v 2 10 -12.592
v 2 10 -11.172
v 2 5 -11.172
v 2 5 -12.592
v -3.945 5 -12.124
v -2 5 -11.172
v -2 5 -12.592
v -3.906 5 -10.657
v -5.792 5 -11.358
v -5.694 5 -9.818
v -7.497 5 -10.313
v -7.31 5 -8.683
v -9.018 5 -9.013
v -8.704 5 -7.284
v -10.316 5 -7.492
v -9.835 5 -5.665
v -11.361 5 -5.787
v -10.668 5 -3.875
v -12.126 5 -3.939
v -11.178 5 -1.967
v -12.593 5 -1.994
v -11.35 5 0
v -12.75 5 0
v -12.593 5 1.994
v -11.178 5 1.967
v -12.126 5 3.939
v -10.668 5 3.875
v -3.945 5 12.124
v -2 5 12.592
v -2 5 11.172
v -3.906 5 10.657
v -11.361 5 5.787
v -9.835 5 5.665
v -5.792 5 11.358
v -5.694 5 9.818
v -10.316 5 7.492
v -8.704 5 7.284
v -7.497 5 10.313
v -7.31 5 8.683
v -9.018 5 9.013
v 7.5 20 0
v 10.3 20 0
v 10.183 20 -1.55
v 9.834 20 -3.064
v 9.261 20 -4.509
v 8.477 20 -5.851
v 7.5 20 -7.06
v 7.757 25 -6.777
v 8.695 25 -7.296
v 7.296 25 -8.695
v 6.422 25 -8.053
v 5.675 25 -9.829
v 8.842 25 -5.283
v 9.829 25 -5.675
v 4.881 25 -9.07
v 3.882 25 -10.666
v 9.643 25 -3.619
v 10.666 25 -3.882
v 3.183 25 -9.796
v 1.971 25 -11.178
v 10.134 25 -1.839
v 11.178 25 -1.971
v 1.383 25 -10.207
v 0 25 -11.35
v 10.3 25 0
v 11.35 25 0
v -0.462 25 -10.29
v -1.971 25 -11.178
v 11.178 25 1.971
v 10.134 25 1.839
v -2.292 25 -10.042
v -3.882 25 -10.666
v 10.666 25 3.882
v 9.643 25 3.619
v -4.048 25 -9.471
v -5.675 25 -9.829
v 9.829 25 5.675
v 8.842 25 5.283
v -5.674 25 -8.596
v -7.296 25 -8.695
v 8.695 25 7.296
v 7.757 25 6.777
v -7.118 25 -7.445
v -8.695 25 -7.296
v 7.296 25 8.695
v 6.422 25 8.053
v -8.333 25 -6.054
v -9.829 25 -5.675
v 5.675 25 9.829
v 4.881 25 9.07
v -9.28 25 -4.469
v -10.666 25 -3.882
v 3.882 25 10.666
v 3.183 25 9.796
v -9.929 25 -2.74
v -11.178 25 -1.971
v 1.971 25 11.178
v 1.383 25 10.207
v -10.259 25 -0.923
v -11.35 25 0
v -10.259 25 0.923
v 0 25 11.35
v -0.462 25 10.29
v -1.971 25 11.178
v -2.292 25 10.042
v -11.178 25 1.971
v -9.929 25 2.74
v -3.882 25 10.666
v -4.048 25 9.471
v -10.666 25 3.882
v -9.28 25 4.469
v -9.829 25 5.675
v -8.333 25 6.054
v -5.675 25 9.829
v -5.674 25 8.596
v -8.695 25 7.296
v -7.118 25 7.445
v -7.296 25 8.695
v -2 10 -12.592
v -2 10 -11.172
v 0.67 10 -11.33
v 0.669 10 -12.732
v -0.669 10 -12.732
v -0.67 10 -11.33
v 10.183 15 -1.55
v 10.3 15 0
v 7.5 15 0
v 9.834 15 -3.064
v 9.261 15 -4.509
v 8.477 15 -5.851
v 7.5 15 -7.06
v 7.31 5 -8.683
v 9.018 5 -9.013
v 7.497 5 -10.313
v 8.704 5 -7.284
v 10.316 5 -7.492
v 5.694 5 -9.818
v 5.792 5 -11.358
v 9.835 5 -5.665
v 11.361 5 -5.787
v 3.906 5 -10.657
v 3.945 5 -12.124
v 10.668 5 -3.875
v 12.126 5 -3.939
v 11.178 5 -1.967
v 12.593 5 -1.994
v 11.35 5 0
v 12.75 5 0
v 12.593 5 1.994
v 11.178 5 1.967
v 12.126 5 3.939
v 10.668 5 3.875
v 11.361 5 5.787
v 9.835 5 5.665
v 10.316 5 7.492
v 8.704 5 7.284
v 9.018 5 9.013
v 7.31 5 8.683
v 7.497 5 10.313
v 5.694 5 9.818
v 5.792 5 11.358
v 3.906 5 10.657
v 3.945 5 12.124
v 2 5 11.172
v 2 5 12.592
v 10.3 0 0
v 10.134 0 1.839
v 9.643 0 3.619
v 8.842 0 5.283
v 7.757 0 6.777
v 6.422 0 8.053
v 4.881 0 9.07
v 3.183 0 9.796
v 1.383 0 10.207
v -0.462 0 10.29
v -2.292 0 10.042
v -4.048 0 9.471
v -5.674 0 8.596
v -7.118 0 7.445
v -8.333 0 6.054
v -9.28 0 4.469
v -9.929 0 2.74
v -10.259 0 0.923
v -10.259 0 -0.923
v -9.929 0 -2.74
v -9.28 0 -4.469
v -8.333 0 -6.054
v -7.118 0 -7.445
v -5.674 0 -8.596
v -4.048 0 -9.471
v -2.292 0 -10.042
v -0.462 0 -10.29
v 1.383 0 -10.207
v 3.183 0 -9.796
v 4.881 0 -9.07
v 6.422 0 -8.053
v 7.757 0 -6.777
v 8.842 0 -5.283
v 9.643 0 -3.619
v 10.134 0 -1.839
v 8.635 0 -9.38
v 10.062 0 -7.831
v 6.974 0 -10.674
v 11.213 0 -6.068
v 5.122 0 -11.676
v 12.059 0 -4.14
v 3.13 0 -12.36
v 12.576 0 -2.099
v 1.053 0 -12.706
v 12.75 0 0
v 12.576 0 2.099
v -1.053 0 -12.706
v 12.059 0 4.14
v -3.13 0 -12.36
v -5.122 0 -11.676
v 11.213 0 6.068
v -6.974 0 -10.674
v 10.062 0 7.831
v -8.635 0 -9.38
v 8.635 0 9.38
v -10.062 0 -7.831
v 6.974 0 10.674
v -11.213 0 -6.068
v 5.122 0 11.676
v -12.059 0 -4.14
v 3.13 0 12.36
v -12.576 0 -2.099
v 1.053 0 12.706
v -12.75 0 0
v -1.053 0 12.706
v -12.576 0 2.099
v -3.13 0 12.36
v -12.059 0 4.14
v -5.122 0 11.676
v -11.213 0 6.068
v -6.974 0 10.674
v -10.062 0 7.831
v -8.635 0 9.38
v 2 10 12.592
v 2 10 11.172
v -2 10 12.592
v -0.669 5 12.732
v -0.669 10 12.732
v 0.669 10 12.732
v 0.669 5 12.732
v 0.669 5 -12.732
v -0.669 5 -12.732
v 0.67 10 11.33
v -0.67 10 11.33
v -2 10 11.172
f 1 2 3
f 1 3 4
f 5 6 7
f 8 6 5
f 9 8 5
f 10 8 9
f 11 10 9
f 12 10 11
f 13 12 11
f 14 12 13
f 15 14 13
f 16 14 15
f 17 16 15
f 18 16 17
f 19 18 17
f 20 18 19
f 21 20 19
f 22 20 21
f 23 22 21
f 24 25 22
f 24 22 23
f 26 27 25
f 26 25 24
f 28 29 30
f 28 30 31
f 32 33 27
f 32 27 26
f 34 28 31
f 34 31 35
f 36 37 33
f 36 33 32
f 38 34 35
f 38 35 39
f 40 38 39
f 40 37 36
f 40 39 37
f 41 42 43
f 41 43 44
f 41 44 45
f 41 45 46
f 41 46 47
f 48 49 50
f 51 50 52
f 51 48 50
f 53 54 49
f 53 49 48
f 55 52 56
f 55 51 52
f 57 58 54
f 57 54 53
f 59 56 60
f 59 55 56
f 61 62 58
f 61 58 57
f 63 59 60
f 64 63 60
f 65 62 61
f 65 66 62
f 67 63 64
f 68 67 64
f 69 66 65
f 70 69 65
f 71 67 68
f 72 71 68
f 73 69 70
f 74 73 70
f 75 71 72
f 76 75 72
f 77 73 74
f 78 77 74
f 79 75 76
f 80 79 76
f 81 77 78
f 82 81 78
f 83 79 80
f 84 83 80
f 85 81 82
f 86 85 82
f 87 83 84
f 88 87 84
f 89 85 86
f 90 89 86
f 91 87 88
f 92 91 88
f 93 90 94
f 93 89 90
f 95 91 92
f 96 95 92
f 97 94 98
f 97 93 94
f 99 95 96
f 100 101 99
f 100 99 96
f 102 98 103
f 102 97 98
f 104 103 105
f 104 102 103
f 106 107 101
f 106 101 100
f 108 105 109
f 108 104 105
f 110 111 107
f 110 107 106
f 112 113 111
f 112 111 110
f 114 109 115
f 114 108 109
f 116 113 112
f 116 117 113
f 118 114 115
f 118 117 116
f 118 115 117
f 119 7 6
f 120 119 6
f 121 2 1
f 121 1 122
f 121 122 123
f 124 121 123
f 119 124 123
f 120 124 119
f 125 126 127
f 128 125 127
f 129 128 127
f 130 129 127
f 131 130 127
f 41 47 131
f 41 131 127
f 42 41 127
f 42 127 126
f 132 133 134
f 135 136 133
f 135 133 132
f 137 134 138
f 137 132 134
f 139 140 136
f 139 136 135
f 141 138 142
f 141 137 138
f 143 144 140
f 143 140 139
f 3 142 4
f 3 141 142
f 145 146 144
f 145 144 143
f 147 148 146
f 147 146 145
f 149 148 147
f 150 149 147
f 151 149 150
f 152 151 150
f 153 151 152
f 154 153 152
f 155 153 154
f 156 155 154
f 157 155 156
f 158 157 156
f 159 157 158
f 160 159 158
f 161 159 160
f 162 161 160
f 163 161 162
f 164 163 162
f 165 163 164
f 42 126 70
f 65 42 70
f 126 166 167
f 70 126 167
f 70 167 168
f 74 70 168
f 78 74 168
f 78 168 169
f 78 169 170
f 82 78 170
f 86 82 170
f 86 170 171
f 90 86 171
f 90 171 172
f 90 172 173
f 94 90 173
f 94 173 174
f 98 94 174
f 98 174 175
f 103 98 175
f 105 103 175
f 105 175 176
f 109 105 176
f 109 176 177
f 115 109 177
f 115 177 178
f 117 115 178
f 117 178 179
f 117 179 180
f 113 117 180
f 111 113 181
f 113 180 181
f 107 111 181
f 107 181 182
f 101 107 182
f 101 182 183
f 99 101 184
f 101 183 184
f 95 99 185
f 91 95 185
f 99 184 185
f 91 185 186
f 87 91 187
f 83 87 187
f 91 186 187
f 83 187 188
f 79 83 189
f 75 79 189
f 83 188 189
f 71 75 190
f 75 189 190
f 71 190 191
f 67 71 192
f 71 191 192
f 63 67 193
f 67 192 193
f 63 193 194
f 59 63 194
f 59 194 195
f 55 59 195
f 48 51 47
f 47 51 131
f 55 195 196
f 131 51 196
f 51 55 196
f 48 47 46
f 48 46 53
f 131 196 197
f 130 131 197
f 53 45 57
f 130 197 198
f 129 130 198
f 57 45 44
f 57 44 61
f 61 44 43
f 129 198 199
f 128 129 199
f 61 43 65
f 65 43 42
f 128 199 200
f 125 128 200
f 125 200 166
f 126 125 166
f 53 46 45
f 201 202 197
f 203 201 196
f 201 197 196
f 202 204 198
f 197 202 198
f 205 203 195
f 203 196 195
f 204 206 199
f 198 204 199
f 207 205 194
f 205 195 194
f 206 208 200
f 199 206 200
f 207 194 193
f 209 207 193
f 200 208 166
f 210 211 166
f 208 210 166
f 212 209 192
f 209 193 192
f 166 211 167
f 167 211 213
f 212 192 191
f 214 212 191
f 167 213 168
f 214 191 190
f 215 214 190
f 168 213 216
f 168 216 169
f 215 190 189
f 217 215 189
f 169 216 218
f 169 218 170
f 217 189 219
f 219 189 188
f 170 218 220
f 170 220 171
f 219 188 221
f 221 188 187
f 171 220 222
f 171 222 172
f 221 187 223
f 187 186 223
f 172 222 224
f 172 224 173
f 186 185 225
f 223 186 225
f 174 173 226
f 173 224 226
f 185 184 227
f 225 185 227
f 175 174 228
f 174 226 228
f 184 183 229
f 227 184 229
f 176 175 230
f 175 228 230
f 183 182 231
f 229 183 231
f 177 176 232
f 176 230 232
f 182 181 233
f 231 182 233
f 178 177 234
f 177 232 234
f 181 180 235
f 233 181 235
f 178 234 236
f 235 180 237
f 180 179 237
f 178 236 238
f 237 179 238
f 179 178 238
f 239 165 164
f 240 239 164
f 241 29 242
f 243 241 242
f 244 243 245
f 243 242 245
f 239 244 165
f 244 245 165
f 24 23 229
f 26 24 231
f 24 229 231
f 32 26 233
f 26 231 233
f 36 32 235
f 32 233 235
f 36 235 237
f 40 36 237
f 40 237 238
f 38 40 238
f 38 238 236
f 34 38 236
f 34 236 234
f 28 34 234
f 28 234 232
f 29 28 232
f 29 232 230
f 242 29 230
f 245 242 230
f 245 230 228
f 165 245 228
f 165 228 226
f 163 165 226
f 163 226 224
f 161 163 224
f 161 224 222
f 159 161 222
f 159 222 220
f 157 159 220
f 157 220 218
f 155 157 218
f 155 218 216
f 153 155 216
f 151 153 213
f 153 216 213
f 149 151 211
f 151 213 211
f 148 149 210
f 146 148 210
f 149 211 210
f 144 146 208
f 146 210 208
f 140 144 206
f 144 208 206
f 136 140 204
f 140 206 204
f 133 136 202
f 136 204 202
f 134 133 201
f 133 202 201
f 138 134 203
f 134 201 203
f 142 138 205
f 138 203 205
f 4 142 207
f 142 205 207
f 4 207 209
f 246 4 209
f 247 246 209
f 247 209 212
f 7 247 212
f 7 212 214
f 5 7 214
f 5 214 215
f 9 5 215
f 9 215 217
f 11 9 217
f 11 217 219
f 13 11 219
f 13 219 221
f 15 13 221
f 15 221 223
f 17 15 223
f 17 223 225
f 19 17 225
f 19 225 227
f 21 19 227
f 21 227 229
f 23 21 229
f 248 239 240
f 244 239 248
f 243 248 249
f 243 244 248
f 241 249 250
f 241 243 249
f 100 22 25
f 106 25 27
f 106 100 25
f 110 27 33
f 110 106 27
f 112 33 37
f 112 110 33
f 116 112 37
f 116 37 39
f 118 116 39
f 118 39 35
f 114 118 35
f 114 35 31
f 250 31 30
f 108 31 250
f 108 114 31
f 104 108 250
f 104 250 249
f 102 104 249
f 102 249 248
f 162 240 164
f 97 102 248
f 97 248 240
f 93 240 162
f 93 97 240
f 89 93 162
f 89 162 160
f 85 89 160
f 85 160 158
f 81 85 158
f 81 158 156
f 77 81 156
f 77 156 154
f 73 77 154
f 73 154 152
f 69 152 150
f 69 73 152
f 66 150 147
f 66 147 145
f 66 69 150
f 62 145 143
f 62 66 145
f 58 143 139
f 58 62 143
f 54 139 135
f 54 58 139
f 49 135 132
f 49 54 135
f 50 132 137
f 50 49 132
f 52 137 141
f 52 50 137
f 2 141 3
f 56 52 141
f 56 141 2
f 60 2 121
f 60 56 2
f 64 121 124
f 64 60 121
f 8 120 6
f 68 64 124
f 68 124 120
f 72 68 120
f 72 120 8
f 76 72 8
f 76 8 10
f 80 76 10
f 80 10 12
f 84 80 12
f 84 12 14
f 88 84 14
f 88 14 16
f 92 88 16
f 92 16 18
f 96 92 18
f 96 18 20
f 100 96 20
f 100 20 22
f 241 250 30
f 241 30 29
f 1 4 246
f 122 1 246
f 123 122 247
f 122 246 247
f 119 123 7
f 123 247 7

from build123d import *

# Parameters (mm, degrees)
F0_R         = 10.3
F1_DEPTH     = 9
F3_R         = 3.1
F4_DEPTH     = 9.001
F6_DEPTH     = 1.8
F7_T4_ANGLE  = 359.64
F7_S5_R      = 3.1
F7_T6_DEPTH  = 5
F7_T10_ANGLE = 359.64
F7_S11_R     = 3.1
F7_T12_DEPTH = 5
F7_T16_ANGLE = 359.64
F7_S17_R     = 3.1
F7_T18_DEPTH = 5
F9_R         = 12.75
F10_DEPTH    = 25
F11_R        = 3.1
F12_DEPTH    = 34.0010001
F13_R        = 12.75
F13_R_2      = 11.35
F14_DEPTH    = 20
F16_DEPTH    = 5
F17_R        = 10.3
F18_DEPTH    = 34.0010001
F20_START    = -5
F20_DEPTH    = 5


# Not quite as in the source:
# - a fillet or chamfer that OpenCascade refuses, or shapes differently, is made with other operations: its cross-section is extruded or revolved along the edge and cut away or added


with BuildPart() as f1:
    # F0 (on Front) → F1 (new body)
    with BuildSketch(Plane.XZ):
        Circle(F0_R)
    extrude(amount=F1_DEPTH)

    # F3 (on face) → F4 (cut, through all)
    with BuildSketch(Plane.XZ.offset(9)):
        Circle(F3_R)
    extrude(amount=-F4_DEPTH, mode=Mode.SUBTRACT)

    # F5 (on face) → F6 (cut)
    with BuildSketch(Plane.XZ.offset(9)):
        with BuildLine():
            ThreePointArc((-3.0819681678, 0.333874546), (-2.6846787517, 1.55), (-1.8301279224, 2.502125454))
            ThreePointArc((-1.8301279224, 2.502125454), (-6.4951905284, 3.75), (-3.0819681678, 0.333874546))
        make_face()
        with BuildLine():
            ThreePointArc((6.8301270189, 2.5), (4.331189746, 4.9999997741), (1.8301279224, 2.502125454))
            ThreePointArc((1.8301279224, 2.502125454), (2.6846787517, 1.55), (3.0819681678, 0.333874546))
            ThreePointArc((3.0819681678, 0.333874546), (5.5810472546, 0.3354680497), (6.8301270189, 2.5))
        make_face()
        with BuildLine():
            ThreePointArc((1.2518402454, -2.836), (0, -3.1), (-1.2518402454, -2.836))
            ThreePointArc((-1.2518402454, -2.836), (-1.2490795384, -7.1655946774), (2.5, -5))
            ThreePointArc((2.5, -5), (2.1655946774, -3.7509204616), (1.2518402454, -2.836))
        make_face()
    extrude(amount=-F6_DEPTH, mode=Mode.SUBTRACT)

    # F7: fillet of radius 1 on 3 edges, made by hand


with BuildPart() as f7_tool2:
    # F7_s3 → F7_t4 (revolve)
    with BuildSketch(Plane(origin=(0.0078111935, 0, 0.0136280797), x_dir=(0, 1, 0), z_dir=(-0.497276838, 0, -0.8675919239))):
        with BuildLine():
            ThreePointArc((-8.2, -2.499975326), (-7.4928932188, -2.7928685448), (-7.2, -3.499975326))
            Line((-7.2, -3.499975326), (-7.18, -3.499975326))
            Line((-7.18, -3.499975326), (-7.18, -2.479975326))
            Line((-7.18, -2.479975326), (-8.2, -2.479975326))
            Line((-8.2, -2.479975326), (-8.2, -2.499975326))
        make_face()
    revolve(axis=Axis((-4.3301270189, -7.2, 2.5), (0, -1, 0)), revolution_arc=F7_T4_ANGLE)

    # F7_s5 → F7_t6 (cut, symmetric)
    with BuildSketch(Plane.XZ.offset(7.7)):
        Circle(F7_S5_R)
    extrude(amount=F7_T6_DEPTH, both=True, mode=Mode.SUBTRACT)


with BuildPart() as f1_1:
    add(f1.part)

    # F7_t1: union F7_tool2
    add(f7_tool2.part)


with BuildPart() as f7_tool8:
    # F7_s9 → F7_t10 (revolve)
    with BuildSketch(Plane(origin=(0.0078966665, 0, -0.0135787318), x_dir=(0, 1, 0), z_dir=(-0.5027182272, 0, 0.8644503364))):
        with BuildLine():
            ThreePointArc((-8.2, -2.499975326), (-7.4928932188, -2.7928685448), (-7.2, -3.499975326))
            Line((-7.2, -3.499975326), (-7.18, -3.499975326))
            Line((-7.18, -3.499975326), (-7.18, -2.479975326))
            Line((-7.18, -2.479975326), (-8.2, -2.479975326))
            Line((-8.2, -2.479975326), (-8.2, -2.499975326))
        make_face()
    revolve(axis=Axis((4.3301270189, -7.2, 2.5), (0, -1, 0)), revolution_arc=F7_T10_ANGLE)

    # F7_s11 → F7_t12 (cut, symmetric)
    with BuildSketch(Plane.XZ.offset(7.7)):
        Circle(F7_S11_R)
    extrude(amount=F7_T12_DEPTH, both=True, mode=Mode.SUBTRACT)


with BuildPart() as f1_2:
    add(f1_1.part)

    # F7_t7: union F7_tool8
    add(f7_tool8.part)


with BuildPart() as f7_tool14:
    # F7_s15 → F7_t16 (revolve)
    with BuildSketch(Plane(origin=(-0.0157078599, 0, -4.93479e-05), x_dir=(0, 1, 0), z_dir=(0.9999950652, 0, 0.0031415875))):
        with BuildLine():
            ThreePointArc((-8.2, -2.499975326), (-7.4928932188, -2.7928685448), (-7.2, -3.499975326))
            Line((-7.2, -3.499975326), (-7.18, -3.499975326))
            Line((-7.18, -3.499975326), (-7.18, -2.479975326))
            Line((-7.18, -2.479975326), (-8.2, -2.479975326))
            Line((-8.2, -2.479975326), (-8.2, -2.499975326))
        make_face()
    revolve(axis=Axis((0, -7.2, -5), (0, -1, 0)), revolution_arc=F7_T16_ANGLE)

    # F7_s17 → F7_t18 (cut, symmetric)
    with BuildSketch(Plane.XZ.offset(7.7)):
        Circle(F7_S17_R)
    extrude(amount=F7_T18_DEPTH, both=True, mode=Mode.SUBTRACT)


with BuildPart() as f1_3:
    add(f1_2.part)

    # F7_t13: union F7_tool14
    add(f7_tool14.part)

    # F9 (on offset) → F10 (join)
    with BuildSketch(Plane(origin=(0, 0, 0), x_dir=(-1, 0, 0), z_dir=(0, 1, 0))):
        Circle(F9_R)
    extrude(amount=F10_DEPTH)

    # F11 (on face) → F12 (cut, through all)
    with BuildSketch(Plane(origin=(0, 25, 0), x_dir=(-1, 0, 0), z_dir=(0, 1, 0))):
        Circle(F11_R)
    extrude(amount=-F12_DEPTH, mode=Mode.SUBTRACT)

    # F13 (on face) → F14 (cut)
    with BuildSketch(Plane(origin=(0, 25, 0), x_dir=(-1, 0, 0), z_dir=(0, 1, 0))):
        Circle(F13_R)
        Circle(F13_R_2, mode=Mode.SUBTRACT)
    extrude(amount=-F14_DEPTH, mode=Mode.SUBTRACT)

    # F15 (on face) → F16 (join)
    with BuildSketch(Plane(origin=(0, 5, 0), x_dir=(-1, 0, 0), z_dir=(0, 1, 0))):
        with BuildLine():
            ThreePointArc((2, 12.5921602595), (0, 12.75), (-2, 12.5921602595))
            Line((-2, 12.5921602595), (-2, 11.1723990262))
            ThreePointArc((-2, 11.1723990262), (0, 11.35), (2, 11.1723990262))
            Line((2, 11.1723990262), (2, 12.5921602595))
        make_face()
        with BuildLine():
            ThreePointArc((2, -11.1723990262), (0, -11.35), (-2, -11.1723990262))
            Line((-2, -11.1723990262), (-2, -12.5921602595))
            ThreePointArc((-2, -12.5921602595), (0, -12.75), (2, -12.5921602595))
            Line((2, -12.5921602595), (2, -11.1723990262))
        make_face()
    extrude(amount=F16_DEPTH)

    # F17 (on face) → F18 (cut, through all)
    with BuildSketch(Plane.XZ.offset(9)):
        Circle(F17_R)
    extrude(amount=-F18_DEPTH, mode=Mode.SUBTRACT)

    # F19 (on face) → F20 (join)
    with BuildSketch(Plane(origin=(0, 25, 0), x_dir=(-1, 0, 0), z_dir=(0, 1, 0)).offset(F20_START)):
        with BuildLine():
            Line((-7.5, 0), (-10.3, 0))
            ThreePointArc((-10.3, 0), (-9.5744451536, -3.7973675092), (-7.5, -7.0597450379))
            Line((-7.5, -7.0597450379), (-7.5, 0))
        make_face()
    extrude(amount=-F20_DEPTH)


solid = f1_3.part
